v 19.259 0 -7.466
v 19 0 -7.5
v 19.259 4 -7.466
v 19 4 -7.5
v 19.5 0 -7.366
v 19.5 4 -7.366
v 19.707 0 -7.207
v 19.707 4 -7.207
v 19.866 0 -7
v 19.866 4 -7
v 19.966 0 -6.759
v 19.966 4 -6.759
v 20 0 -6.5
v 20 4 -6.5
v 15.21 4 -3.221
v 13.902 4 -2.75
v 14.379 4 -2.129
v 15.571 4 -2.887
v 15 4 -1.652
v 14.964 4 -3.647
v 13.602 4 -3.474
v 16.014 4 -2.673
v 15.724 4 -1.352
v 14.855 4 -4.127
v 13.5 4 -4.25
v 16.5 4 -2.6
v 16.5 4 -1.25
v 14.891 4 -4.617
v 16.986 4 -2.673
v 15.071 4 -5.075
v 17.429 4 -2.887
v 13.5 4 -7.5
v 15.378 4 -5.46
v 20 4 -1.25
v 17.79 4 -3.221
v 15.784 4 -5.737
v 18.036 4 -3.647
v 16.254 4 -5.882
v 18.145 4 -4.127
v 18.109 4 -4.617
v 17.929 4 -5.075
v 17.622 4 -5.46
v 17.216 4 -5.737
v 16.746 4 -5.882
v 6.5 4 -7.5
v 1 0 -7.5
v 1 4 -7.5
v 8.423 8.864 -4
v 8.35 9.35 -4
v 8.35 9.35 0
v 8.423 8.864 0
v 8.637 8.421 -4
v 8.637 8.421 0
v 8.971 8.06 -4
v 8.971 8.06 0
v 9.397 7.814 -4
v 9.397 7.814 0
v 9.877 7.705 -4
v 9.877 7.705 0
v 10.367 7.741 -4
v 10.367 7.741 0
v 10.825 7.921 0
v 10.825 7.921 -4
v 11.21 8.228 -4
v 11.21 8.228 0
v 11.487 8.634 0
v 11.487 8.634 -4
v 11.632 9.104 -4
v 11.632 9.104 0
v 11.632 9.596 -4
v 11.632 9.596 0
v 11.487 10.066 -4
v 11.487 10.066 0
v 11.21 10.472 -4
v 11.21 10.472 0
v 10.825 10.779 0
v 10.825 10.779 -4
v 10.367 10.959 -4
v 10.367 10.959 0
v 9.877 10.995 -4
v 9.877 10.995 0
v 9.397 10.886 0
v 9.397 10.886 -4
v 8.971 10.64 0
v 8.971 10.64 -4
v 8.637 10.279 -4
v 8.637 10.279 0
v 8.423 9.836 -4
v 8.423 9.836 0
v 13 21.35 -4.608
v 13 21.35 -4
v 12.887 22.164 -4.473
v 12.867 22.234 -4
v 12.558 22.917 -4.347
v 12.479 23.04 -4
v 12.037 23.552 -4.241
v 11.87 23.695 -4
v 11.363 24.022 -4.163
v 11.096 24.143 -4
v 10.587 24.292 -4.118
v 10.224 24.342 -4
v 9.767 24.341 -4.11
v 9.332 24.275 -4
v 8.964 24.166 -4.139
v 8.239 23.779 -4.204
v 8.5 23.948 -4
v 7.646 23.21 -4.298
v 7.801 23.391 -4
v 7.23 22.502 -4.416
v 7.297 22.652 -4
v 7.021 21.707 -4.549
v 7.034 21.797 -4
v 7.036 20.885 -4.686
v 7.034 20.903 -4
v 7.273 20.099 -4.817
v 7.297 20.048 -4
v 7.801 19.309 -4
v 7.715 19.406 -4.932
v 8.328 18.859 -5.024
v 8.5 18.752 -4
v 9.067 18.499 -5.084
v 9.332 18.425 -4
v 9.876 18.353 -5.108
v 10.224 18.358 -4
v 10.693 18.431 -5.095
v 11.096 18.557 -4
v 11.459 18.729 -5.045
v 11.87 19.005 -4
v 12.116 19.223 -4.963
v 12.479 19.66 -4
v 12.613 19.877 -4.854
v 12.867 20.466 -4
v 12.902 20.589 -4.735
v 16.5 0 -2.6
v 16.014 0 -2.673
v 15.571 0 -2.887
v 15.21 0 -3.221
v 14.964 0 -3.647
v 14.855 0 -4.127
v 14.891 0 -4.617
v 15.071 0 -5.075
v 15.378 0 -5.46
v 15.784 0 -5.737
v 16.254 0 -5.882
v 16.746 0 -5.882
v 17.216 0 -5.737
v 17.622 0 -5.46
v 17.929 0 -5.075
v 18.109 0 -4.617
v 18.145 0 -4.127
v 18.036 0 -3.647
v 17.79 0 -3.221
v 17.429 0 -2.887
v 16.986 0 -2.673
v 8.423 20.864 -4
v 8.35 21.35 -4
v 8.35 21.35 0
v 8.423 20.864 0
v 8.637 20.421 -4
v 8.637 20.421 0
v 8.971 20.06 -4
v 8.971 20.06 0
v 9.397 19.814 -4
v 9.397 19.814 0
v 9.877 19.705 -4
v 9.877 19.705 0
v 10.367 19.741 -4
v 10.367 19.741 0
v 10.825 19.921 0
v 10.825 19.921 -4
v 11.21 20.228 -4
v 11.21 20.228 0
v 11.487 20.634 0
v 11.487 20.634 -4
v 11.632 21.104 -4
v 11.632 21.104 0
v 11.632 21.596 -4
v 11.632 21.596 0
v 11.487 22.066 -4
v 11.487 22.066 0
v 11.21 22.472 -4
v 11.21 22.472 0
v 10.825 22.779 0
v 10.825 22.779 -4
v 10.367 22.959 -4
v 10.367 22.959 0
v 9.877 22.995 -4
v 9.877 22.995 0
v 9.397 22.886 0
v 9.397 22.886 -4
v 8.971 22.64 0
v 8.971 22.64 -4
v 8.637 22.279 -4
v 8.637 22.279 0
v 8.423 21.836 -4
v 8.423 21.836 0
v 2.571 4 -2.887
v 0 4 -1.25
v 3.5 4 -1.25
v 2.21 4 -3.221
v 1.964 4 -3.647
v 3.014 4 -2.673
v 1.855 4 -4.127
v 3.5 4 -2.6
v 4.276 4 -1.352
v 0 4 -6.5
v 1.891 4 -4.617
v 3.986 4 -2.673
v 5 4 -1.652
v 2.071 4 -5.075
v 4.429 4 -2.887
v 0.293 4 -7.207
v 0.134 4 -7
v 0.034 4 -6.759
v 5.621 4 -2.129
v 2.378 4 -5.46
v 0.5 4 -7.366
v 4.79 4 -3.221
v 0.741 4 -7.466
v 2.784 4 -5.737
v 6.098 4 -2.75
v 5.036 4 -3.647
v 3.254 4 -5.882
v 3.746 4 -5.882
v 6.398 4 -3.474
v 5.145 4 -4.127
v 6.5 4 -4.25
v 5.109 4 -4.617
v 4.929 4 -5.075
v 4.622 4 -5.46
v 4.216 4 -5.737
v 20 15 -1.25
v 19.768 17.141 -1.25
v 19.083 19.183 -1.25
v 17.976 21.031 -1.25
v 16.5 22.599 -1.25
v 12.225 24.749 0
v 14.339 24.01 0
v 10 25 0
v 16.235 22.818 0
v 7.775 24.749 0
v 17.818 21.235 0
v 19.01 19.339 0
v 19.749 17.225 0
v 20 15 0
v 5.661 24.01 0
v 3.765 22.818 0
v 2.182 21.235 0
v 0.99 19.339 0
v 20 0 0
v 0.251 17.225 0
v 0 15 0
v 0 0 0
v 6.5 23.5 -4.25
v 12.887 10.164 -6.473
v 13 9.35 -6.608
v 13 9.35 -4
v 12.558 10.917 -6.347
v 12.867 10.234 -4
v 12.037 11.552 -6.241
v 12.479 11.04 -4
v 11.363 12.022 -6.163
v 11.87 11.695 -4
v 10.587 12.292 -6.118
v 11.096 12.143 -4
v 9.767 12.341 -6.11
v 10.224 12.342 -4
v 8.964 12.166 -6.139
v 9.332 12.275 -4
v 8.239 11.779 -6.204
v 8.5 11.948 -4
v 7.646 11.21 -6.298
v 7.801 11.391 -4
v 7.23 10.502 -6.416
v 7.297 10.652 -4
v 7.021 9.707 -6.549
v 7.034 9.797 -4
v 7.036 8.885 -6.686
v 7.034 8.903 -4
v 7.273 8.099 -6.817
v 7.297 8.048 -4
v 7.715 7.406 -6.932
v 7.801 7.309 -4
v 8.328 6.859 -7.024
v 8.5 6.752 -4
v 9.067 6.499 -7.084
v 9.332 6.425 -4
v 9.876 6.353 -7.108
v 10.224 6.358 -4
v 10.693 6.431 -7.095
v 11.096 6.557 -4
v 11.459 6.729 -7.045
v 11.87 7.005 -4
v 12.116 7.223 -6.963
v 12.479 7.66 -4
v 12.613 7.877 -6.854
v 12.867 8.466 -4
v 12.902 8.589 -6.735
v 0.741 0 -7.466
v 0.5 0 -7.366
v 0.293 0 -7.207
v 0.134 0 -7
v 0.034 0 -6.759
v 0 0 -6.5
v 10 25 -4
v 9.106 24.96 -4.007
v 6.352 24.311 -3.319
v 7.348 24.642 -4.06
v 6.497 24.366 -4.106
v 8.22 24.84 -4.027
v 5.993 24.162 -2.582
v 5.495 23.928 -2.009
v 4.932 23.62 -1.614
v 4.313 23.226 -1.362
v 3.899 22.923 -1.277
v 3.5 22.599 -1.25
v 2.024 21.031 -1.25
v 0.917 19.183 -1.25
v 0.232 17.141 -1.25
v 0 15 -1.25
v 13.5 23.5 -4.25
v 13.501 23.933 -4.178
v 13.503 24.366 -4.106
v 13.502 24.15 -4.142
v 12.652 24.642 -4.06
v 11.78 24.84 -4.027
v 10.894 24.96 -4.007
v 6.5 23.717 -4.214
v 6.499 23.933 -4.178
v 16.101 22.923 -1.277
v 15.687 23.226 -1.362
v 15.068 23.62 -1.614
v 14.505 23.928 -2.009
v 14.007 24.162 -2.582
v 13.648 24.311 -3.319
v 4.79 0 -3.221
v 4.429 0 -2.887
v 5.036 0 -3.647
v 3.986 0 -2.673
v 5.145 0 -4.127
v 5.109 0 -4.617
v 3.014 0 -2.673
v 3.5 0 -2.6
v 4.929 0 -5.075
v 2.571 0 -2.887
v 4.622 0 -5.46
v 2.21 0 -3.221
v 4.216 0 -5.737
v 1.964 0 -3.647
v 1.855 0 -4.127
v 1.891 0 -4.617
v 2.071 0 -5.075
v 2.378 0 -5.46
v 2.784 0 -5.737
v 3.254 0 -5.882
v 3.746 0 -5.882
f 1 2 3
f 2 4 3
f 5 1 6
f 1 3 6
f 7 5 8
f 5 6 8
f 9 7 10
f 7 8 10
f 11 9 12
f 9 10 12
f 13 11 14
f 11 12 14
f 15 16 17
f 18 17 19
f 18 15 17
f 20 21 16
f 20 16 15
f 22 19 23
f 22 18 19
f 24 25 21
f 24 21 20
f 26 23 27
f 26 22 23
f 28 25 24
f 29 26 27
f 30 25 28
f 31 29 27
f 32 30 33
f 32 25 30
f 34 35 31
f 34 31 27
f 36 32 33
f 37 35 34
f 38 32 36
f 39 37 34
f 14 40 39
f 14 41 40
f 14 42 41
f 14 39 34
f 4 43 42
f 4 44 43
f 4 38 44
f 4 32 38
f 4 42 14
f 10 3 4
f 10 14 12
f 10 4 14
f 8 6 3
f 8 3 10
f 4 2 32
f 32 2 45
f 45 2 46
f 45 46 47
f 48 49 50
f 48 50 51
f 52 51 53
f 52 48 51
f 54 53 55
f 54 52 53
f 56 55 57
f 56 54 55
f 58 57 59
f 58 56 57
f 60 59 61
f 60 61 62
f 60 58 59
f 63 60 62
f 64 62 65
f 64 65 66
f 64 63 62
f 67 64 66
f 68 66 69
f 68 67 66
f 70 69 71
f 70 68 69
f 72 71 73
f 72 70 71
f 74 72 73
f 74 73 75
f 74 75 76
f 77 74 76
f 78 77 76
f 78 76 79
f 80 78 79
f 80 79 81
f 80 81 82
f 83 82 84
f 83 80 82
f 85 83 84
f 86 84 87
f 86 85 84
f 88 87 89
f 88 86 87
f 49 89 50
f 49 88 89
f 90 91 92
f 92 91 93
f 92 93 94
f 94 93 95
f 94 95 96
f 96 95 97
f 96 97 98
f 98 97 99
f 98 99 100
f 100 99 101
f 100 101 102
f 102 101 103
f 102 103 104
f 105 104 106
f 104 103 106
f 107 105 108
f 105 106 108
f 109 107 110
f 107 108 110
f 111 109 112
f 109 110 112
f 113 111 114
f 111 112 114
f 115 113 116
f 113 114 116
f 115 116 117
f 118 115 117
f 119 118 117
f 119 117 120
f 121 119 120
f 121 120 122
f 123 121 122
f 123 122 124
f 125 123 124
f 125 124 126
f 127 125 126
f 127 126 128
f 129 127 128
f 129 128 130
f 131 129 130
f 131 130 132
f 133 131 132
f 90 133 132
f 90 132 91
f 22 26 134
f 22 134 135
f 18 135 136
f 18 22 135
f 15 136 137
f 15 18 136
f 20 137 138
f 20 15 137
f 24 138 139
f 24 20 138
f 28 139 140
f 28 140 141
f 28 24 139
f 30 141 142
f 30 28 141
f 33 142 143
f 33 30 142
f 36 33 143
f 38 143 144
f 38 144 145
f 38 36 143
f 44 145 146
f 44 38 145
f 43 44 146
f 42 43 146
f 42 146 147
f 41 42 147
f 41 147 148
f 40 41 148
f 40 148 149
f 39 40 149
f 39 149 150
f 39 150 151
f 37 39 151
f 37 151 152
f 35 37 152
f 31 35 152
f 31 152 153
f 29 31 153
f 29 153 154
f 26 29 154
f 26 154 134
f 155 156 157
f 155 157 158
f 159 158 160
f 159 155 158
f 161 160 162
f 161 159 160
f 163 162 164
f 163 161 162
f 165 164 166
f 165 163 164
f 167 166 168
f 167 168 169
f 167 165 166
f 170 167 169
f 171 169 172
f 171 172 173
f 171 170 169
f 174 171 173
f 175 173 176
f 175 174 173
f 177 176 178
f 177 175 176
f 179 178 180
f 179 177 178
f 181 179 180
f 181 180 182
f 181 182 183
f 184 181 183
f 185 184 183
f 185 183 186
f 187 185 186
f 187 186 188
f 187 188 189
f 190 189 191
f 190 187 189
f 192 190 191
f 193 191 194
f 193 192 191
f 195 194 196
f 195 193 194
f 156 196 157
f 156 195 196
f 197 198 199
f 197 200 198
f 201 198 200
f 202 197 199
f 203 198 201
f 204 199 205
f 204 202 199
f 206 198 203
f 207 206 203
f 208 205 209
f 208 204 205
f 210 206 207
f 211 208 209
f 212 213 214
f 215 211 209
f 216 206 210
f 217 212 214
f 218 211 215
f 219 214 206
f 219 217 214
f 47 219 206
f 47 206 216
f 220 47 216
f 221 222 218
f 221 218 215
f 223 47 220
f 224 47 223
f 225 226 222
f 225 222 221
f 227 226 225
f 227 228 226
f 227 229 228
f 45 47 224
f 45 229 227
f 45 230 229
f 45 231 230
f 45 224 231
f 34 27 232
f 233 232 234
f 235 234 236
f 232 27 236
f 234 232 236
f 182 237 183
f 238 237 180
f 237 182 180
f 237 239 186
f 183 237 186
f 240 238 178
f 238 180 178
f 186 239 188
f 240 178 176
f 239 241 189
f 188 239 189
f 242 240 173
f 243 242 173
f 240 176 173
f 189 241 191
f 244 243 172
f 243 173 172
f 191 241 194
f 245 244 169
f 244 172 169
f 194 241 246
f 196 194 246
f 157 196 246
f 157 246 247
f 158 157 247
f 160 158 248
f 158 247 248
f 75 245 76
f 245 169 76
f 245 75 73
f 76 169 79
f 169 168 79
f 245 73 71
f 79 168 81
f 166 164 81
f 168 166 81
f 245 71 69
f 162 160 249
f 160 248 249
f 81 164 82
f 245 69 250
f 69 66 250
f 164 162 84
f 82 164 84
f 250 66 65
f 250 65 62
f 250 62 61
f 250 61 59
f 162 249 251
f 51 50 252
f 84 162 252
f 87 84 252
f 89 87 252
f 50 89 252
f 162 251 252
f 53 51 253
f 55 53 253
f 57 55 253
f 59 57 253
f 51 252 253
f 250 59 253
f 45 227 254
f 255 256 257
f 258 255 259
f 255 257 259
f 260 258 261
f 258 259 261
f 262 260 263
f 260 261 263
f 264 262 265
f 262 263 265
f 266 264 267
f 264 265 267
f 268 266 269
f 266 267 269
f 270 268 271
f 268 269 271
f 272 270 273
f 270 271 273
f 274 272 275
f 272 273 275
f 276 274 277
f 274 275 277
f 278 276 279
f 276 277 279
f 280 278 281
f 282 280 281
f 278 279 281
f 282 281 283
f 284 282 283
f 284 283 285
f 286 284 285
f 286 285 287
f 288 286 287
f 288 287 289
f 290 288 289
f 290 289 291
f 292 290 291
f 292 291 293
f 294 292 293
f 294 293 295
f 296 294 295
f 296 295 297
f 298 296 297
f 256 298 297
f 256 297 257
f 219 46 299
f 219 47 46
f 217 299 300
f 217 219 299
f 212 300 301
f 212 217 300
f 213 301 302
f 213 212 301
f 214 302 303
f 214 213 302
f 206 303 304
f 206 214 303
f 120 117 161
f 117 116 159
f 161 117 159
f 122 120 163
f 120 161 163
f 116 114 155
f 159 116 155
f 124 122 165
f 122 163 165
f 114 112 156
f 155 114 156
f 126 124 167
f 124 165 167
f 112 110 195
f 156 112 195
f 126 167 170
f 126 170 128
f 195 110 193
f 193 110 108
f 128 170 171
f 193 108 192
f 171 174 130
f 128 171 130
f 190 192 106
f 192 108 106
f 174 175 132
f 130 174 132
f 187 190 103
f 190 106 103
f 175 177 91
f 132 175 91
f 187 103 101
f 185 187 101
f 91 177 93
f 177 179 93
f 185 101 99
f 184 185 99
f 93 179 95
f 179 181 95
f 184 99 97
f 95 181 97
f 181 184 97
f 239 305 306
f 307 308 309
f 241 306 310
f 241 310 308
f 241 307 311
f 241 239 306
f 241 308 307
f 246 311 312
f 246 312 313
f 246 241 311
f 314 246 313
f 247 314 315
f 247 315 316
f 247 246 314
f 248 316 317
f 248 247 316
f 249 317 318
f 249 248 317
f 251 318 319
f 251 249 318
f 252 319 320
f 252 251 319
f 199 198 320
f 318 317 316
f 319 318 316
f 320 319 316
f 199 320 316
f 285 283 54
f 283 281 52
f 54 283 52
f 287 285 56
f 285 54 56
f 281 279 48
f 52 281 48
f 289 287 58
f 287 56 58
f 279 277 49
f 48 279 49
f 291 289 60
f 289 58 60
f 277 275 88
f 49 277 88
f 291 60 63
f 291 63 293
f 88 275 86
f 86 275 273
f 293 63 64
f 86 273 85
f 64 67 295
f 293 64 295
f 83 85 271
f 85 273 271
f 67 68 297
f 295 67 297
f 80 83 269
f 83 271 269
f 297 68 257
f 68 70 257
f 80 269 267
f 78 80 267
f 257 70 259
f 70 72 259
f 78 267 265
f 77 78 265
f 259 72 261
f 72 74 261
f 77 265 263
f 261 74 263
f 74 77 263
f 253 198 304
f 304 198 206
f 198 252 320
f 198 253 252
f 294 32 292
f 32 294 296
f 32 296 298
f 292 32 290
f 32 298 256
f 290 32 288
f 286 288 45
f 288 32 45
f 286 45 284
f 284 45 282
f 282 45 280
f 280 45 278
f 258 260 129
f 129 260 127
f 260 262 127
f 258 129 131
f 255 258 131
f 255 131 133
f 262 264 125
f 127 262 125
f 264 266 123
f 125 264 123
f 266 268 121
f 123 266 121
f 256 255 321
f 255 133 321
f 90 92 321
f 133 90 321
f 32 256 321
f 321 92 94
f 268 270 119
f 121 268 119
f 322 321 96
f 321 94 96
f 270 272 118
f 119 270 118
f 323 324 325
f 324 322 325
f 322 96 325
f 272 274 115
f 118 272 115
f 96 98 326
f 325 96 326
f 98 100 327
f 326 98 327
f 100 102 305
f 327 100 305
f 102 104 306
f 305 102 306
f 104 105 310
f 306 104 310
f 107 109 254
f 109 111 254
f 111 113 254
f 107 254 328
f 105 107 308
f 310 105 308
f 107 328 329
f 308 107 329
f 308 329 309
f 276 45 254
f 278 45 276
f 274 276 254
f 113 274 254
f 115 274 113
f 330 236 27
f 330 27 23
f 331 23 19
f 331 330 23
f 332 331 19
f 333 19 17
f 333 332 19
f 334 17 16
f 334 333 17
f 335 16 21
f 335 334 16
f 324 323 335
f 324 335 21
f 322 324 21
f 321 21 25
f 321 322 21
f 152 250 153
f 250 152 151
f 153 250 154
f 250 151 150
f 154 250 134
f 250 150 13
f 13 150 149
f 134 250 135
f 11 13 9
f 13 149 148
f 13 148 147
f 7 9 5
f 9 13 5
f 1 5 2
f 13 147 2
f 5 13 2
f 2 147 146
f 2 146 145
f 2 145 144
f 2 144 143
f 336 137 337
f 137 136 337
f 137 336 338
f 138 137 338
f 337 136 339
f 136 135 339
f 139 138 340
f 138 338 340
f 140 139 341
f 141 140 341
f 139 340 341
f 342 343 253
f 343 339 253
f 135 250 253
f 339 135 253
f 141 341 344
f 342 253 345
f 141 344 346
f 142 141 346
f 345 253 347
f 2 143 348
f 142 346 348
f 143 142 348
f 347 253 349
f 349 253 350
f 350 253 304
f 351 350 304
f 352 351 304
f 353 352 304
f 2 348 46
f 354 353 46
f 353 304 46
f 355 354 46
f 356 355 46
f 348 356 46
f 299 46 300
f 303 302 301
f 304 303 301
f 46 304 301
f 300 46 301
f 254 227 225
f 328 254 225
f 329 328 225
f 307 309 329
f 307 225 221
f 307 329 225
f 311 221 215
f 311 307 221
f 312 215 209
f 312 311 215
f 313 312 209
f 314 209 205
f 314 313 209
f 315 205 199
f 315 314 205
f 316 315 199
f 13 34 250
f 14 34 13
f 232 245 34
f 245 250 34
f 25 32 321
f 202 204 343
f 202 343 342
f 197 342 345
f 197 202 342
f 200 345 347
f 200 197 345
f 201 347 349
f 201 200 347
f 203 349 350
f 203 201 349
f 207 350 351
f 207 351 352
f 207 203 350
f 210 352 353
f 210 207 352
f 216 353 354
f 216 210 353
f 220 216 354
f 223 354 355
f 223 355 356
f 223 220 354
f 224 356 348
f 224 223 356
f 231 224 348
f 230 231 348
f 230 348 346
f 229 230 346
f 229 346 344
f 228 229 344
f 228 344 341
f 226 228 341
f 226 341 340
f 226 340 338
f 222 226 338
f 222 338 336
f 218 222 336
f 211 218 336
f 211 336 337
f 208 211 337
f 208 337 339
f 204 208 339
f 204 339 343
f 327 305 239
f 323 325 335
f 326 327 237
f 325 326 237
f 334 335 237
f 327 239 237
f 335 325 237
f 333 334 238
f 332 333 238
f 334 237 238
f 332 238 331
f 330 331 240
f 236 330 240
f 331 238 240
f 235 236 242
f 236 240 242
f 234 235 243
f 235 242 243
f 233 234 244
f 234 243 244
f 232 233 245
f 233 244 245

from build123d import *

# Parameters (mm, degrees)
EXTRUDE_1_DEPTH                 = 20
SKETCH_2_R                      = 1.65
CUT_EXTRUDE_1_DEPTH             = 4
CUT_EXTRUDE_1_DIRECTION_2_REACH = 31.954
CUT_EXTRUDE_START               = -21
SKETCH_3_R                      = 3
CUT_EXTRUDE_2_DEPTH             = 21
SKETCH_4_R                      = 1.65
CUT_EXTRUDE_3_DEPTH             = 4
CUT_EXTRUDE_3_DIRECTION_2_REACH = 34.265
CUT_EXTRUDE_7_REACH             = 34.265
SKETCH_5_R                      = 3
CUT_EXTRUDE_8_DEPTH             = 21
FILLET_1_R                      = 10
FILLET_2_R                      = 1


with BuildPart() as part:
    # Эскиз1 → Бобышка-Вытянуть1 (new body)
    with BuildSketch(Plane(origin=(0, 0, 0), x_dir=(0, 0, -1), z_dir=(1, 0, 0))):
        Polygon((0, 0), (7.5, 0), (7.5, 4), (4, 25), (0, 25), align=None)
    extrude(amount=EXTRUDE_1_DEPTH)

    # Эскиз2 → Вырез-Вытянуть1 (cut)
    with BuildSketch(Plane(origin=(0, 4, 0), x_dir=(-1, 0, 0), z_dir=(0, -1, 0))):
        with Locations(Location((-16.5, 4.25, 0), (0, 0, 270))):
            Circle(SKETCH_2_R)
        with Locations(Location((-3.5, 4.25, 0), (0, 0, 270))):
            Circle(SKETCH_2_R)
    extrude(amount=CUT_EXTRUDE_1_DEPTH, mode=Mode.SUBTRACT)

    # Вырез-Вытянуть1 direction 2: up to this plane
    cut_extrude_1_direction_2_end = Plane(origin=(20, 25, -4), z_dir=(0, -0.16439898730535726, 0.9863939238321437))
    # Эскиз2 → Вырез-Вытянуть1 direction 2 (cut, up to the surface)
    with BuildSketch(Plane(origin=(0, 4, 0), x_dir=(-1, 0, 0), z_dir=(0, -1, 0)), mode=Mode.PRIVATE) as cut_extrude_1_direction_2_sk1:
        with Locations(Location((-16.5, 4.25, 0), (0, 0, 270))):
            Circle(SKETCH_2_R)
    cut_extrude_1_direction_2_tool1 = split(extrude(cut_extrude_1_direction_2_sk1.sketch, amount=-CUT_EXTRUDE_1_DIRECTION_2_REACH, mode=Mode.PRIVATE), bisect_by=cut_extrude_1_direction_2_end, keep=Keep.BOTH, mode=Mode.PRIVATE)
    add(cut_extrude_1_direction_2_tool1.solids().sort_by_distance((16.5, 4, -4.25))[0], mode=Mode.SUBTRACT)
    # Эскиз2 → Вырез-Вытянуть1 direction 2 (cut, up to the surface)
    with BuildSketch(Plane(origin=(0, 4, 0), x_dir=(-1, 0, 0), z_dir=(0, -1, 0)), mode=Mode.PRIVATE) as cut_extrude_1_direction_2_sk2:
        with Locations(Location((-3.5, 4.25, 0), (0, 0, 270))):
            Circle(SKETCH_2_R)
    cut_extrude_1_direction_2_tool2 = split(extrude(cut_extrude_1_direction_2_sk2.sketch, amount=-CUT_EXTRUDE_1_DIRECTION_2_REACH, mode=Mode.PRIVATE), bisect_by=cut_extrude_1_direction_2_end, keep=Keep.BOTH, mode=Mode.PRIVATE)
    add(cut_extrude_1_direction_2_tool2.solids().sort_by_distance((3.5, 4, -4.25))[0], mode=Mode.SUBTRACT)

    # Эскиз3 → Вырез-Вытянуть2 (cut)
    with BuildSketch(Plane(origin=(0, 4, 0), x_dir=(-1, 0, 0), z_dir=(0, -1, 0)).offset(CUT_EXTRUDE_START)):
        with Locations(Location((-16.5, 4.25, 0), (0, 0, 90))):
            Circle(SKETCH_3_R)
        with Locations(Location((-3.5, 4.25, 0), (0, 0, 90))):
            Circle(SKETCH_3_R)
    extrude(amount=CUT_EXTRUDE_2_DEPTH, mode=Mode.SUBTRACT)

    # Эскиз4 → Вырез-Вытянуть3 (cut)
    with BuildSketch(Plane.XY.offset(-4)):
        with Locations(Location((10, 21.35, 0), (0, 0, 180))):
            Circle(SKETCH_4_R)
        with Locations(Location((10, 9.35, 0), (0, 0, 180))):
            Circle(SKETCH_4_R)
    extrude(amount=CUT_EXTRUDE_3_DEPTH, mode=Mode.SUBTRACT)

    # Вырез-Вытянуть3 direction 2: up to this plane
    cut_extrude_3_direction_2_end = Plane(origin=(20, 25, -4), z_dir=(0, -0.16439898730535726, 0.9863939238321437))
    # Эскиз4 → Вырез-Вытянуть3 direction 2 (cut, up to the surface)
    with BuildSketch(Plane.XY.offset(-4), mode=Mode.PRIVATE) as cut_extrude_3_direction_2_sk1:
        with Locations(Location((10, 21.35, 0), (0, 0, 180))):
            Circle(SKETCH_4_R)
    cut_extrude_3_direction_2_tool1 = split(extrude(cut_extrude_3_direction_2_sk1.sketch, amount=-CUT_EXTRUDE_3_DIRECTION_2_REACH, mode=Mode.PRIVATE), bisect_by=cut_extrude_3_direction_2_end, keep=Keep.BOTH, mode=Mode.PRIVATE)
    add(cut_extrude_3_direction_2_tool1.solids().sort_by_distance((10, 21.35, -4))[0], mode=Mode.SUBTRACT)
    # Эскиз4 → Вырез-Вытянуть3 direction 2 (cut, up to the surface)
    with BuildSketch(Plane.XY.offset(-4), mode=Mode.PRIVATE) as cut_extrude_3_direction_2_sk2:
        with Locations(Location((10, 9.35, 0), (0, 0, 180))):
            Circle(SKETCH_4_R)
    cut_extrude_3_direction_2_tool2 = split(extrude(cut_extrude_3_direction_2_sk2.sketch, amount=-CUT_EXTRUDE_3_DIRECTION_2_REACH, mode=Mode.PRIVATE), bisect_by=cut_extrude_3_direction_2_end, keep=Keep.BOTH, mode=Mode.PRIVATE)
    add(cut_extrude_3_direction_2_tool2.solids().sort_by_distance((10, 9.35, -4))[0], mode=Mode.SUBTRACT)

    # Вырез-Вытянуть7: up to this plane
    cut_extrude_7_end = Plane(origin=(20, 25, -4), z_dir=(0, -0.16439898730535726, 0.9863939238321437))
    # Эскиз5 → Вырез-Вытянуть7 (cut, up to the surface)
    with BuildSketch(Plane.XY.offset(-4), mode=Mode.PRIVATE) as cut_extrude_7_sk1:
        with Locations((10, 21.35)):
            Circle(SKETCH_5_R)
    cut_extrude_7_tool1 = split(extrude(cut_extrude_7_sk1.sketch, amount=-CUT_EXTRUDE_7_REACH, mode=Mode.PRIVATE), bisect_by=cut_extrude_7_end, keep=Keep.BOTH, mode=Mode.PRIVATE)
    add(cut_extrude_7_tool1.solids().sort_by_distance((10, 21.35, -4))[0], mode=Mode.SUBTRACT)
    # Эскиз5 → Вырез-Вытянуть7 (cut, up to the surface)
    with BuildSketch(Plane.XY.offset(-4), mode=Mode.PRIVATE) as cut_extrude_7_sk2:
        with Locations((10, 9.35)):
            Circle(SKETCH_5_R)
    cut_extrude_7_tool2 = split(extrude(cut_extrude_7_sk2.sketch, amount=-CUT_EXTRUDE_7_REACH, mode=Mode.PRIVATE), bisect_by=cut_extrude_7_end, keep=Keep.BOTH, mode=Mode.PRIVATE)
    add(cut_extrude_7_tool2.solids().sort_by_distance((10, 9.35, -4))[0], mode=Mode.SUBTRACT)

    # Эскиз6 → Вырез-Вытянуть8 (cut)
    with BuildSketch(Plane(origin=(0, 25, 0), x_dir=(1, 0, 0), z_dir=(0, 1, 0))):
        Polygon((0, 7.5), (0, 1.25), (3.5, 1.25), (3.5, 4.25), (6.5, 4.25), (6.5, 7.5), align=None)
        Polygon((13.5, 4.25), (16.5, 4.25), (16.5, 1.25), (20, 1.25), (20, 7.5), (13.5, 7.5), align=None)
    extrude(amount=-CUT_EXTRUDE_8_DEPTH, mode=Mode.SUBTRACT)

    # Скругление1
    fillet_1_edges = [part.edges().sort_by_distance(p)[0] for p in [
        (0, 25, -0.625),
        (20, 25, -0.625),
    ]]
    fillet(fillet_1_edges, radius=FILLET_1_R - 0.0001)  # a hair under: the kernel refuses the full size

    # Скругление2
    fillet_2_edges = [part.edges().sort_by_distance(p)[0] for p in [
        (20, 2, -7.5),
        (0, 2, -7.5),
    ]]
    fillet(fillet_2_edges, radius=FILLET_2_R)


solid = part.part
